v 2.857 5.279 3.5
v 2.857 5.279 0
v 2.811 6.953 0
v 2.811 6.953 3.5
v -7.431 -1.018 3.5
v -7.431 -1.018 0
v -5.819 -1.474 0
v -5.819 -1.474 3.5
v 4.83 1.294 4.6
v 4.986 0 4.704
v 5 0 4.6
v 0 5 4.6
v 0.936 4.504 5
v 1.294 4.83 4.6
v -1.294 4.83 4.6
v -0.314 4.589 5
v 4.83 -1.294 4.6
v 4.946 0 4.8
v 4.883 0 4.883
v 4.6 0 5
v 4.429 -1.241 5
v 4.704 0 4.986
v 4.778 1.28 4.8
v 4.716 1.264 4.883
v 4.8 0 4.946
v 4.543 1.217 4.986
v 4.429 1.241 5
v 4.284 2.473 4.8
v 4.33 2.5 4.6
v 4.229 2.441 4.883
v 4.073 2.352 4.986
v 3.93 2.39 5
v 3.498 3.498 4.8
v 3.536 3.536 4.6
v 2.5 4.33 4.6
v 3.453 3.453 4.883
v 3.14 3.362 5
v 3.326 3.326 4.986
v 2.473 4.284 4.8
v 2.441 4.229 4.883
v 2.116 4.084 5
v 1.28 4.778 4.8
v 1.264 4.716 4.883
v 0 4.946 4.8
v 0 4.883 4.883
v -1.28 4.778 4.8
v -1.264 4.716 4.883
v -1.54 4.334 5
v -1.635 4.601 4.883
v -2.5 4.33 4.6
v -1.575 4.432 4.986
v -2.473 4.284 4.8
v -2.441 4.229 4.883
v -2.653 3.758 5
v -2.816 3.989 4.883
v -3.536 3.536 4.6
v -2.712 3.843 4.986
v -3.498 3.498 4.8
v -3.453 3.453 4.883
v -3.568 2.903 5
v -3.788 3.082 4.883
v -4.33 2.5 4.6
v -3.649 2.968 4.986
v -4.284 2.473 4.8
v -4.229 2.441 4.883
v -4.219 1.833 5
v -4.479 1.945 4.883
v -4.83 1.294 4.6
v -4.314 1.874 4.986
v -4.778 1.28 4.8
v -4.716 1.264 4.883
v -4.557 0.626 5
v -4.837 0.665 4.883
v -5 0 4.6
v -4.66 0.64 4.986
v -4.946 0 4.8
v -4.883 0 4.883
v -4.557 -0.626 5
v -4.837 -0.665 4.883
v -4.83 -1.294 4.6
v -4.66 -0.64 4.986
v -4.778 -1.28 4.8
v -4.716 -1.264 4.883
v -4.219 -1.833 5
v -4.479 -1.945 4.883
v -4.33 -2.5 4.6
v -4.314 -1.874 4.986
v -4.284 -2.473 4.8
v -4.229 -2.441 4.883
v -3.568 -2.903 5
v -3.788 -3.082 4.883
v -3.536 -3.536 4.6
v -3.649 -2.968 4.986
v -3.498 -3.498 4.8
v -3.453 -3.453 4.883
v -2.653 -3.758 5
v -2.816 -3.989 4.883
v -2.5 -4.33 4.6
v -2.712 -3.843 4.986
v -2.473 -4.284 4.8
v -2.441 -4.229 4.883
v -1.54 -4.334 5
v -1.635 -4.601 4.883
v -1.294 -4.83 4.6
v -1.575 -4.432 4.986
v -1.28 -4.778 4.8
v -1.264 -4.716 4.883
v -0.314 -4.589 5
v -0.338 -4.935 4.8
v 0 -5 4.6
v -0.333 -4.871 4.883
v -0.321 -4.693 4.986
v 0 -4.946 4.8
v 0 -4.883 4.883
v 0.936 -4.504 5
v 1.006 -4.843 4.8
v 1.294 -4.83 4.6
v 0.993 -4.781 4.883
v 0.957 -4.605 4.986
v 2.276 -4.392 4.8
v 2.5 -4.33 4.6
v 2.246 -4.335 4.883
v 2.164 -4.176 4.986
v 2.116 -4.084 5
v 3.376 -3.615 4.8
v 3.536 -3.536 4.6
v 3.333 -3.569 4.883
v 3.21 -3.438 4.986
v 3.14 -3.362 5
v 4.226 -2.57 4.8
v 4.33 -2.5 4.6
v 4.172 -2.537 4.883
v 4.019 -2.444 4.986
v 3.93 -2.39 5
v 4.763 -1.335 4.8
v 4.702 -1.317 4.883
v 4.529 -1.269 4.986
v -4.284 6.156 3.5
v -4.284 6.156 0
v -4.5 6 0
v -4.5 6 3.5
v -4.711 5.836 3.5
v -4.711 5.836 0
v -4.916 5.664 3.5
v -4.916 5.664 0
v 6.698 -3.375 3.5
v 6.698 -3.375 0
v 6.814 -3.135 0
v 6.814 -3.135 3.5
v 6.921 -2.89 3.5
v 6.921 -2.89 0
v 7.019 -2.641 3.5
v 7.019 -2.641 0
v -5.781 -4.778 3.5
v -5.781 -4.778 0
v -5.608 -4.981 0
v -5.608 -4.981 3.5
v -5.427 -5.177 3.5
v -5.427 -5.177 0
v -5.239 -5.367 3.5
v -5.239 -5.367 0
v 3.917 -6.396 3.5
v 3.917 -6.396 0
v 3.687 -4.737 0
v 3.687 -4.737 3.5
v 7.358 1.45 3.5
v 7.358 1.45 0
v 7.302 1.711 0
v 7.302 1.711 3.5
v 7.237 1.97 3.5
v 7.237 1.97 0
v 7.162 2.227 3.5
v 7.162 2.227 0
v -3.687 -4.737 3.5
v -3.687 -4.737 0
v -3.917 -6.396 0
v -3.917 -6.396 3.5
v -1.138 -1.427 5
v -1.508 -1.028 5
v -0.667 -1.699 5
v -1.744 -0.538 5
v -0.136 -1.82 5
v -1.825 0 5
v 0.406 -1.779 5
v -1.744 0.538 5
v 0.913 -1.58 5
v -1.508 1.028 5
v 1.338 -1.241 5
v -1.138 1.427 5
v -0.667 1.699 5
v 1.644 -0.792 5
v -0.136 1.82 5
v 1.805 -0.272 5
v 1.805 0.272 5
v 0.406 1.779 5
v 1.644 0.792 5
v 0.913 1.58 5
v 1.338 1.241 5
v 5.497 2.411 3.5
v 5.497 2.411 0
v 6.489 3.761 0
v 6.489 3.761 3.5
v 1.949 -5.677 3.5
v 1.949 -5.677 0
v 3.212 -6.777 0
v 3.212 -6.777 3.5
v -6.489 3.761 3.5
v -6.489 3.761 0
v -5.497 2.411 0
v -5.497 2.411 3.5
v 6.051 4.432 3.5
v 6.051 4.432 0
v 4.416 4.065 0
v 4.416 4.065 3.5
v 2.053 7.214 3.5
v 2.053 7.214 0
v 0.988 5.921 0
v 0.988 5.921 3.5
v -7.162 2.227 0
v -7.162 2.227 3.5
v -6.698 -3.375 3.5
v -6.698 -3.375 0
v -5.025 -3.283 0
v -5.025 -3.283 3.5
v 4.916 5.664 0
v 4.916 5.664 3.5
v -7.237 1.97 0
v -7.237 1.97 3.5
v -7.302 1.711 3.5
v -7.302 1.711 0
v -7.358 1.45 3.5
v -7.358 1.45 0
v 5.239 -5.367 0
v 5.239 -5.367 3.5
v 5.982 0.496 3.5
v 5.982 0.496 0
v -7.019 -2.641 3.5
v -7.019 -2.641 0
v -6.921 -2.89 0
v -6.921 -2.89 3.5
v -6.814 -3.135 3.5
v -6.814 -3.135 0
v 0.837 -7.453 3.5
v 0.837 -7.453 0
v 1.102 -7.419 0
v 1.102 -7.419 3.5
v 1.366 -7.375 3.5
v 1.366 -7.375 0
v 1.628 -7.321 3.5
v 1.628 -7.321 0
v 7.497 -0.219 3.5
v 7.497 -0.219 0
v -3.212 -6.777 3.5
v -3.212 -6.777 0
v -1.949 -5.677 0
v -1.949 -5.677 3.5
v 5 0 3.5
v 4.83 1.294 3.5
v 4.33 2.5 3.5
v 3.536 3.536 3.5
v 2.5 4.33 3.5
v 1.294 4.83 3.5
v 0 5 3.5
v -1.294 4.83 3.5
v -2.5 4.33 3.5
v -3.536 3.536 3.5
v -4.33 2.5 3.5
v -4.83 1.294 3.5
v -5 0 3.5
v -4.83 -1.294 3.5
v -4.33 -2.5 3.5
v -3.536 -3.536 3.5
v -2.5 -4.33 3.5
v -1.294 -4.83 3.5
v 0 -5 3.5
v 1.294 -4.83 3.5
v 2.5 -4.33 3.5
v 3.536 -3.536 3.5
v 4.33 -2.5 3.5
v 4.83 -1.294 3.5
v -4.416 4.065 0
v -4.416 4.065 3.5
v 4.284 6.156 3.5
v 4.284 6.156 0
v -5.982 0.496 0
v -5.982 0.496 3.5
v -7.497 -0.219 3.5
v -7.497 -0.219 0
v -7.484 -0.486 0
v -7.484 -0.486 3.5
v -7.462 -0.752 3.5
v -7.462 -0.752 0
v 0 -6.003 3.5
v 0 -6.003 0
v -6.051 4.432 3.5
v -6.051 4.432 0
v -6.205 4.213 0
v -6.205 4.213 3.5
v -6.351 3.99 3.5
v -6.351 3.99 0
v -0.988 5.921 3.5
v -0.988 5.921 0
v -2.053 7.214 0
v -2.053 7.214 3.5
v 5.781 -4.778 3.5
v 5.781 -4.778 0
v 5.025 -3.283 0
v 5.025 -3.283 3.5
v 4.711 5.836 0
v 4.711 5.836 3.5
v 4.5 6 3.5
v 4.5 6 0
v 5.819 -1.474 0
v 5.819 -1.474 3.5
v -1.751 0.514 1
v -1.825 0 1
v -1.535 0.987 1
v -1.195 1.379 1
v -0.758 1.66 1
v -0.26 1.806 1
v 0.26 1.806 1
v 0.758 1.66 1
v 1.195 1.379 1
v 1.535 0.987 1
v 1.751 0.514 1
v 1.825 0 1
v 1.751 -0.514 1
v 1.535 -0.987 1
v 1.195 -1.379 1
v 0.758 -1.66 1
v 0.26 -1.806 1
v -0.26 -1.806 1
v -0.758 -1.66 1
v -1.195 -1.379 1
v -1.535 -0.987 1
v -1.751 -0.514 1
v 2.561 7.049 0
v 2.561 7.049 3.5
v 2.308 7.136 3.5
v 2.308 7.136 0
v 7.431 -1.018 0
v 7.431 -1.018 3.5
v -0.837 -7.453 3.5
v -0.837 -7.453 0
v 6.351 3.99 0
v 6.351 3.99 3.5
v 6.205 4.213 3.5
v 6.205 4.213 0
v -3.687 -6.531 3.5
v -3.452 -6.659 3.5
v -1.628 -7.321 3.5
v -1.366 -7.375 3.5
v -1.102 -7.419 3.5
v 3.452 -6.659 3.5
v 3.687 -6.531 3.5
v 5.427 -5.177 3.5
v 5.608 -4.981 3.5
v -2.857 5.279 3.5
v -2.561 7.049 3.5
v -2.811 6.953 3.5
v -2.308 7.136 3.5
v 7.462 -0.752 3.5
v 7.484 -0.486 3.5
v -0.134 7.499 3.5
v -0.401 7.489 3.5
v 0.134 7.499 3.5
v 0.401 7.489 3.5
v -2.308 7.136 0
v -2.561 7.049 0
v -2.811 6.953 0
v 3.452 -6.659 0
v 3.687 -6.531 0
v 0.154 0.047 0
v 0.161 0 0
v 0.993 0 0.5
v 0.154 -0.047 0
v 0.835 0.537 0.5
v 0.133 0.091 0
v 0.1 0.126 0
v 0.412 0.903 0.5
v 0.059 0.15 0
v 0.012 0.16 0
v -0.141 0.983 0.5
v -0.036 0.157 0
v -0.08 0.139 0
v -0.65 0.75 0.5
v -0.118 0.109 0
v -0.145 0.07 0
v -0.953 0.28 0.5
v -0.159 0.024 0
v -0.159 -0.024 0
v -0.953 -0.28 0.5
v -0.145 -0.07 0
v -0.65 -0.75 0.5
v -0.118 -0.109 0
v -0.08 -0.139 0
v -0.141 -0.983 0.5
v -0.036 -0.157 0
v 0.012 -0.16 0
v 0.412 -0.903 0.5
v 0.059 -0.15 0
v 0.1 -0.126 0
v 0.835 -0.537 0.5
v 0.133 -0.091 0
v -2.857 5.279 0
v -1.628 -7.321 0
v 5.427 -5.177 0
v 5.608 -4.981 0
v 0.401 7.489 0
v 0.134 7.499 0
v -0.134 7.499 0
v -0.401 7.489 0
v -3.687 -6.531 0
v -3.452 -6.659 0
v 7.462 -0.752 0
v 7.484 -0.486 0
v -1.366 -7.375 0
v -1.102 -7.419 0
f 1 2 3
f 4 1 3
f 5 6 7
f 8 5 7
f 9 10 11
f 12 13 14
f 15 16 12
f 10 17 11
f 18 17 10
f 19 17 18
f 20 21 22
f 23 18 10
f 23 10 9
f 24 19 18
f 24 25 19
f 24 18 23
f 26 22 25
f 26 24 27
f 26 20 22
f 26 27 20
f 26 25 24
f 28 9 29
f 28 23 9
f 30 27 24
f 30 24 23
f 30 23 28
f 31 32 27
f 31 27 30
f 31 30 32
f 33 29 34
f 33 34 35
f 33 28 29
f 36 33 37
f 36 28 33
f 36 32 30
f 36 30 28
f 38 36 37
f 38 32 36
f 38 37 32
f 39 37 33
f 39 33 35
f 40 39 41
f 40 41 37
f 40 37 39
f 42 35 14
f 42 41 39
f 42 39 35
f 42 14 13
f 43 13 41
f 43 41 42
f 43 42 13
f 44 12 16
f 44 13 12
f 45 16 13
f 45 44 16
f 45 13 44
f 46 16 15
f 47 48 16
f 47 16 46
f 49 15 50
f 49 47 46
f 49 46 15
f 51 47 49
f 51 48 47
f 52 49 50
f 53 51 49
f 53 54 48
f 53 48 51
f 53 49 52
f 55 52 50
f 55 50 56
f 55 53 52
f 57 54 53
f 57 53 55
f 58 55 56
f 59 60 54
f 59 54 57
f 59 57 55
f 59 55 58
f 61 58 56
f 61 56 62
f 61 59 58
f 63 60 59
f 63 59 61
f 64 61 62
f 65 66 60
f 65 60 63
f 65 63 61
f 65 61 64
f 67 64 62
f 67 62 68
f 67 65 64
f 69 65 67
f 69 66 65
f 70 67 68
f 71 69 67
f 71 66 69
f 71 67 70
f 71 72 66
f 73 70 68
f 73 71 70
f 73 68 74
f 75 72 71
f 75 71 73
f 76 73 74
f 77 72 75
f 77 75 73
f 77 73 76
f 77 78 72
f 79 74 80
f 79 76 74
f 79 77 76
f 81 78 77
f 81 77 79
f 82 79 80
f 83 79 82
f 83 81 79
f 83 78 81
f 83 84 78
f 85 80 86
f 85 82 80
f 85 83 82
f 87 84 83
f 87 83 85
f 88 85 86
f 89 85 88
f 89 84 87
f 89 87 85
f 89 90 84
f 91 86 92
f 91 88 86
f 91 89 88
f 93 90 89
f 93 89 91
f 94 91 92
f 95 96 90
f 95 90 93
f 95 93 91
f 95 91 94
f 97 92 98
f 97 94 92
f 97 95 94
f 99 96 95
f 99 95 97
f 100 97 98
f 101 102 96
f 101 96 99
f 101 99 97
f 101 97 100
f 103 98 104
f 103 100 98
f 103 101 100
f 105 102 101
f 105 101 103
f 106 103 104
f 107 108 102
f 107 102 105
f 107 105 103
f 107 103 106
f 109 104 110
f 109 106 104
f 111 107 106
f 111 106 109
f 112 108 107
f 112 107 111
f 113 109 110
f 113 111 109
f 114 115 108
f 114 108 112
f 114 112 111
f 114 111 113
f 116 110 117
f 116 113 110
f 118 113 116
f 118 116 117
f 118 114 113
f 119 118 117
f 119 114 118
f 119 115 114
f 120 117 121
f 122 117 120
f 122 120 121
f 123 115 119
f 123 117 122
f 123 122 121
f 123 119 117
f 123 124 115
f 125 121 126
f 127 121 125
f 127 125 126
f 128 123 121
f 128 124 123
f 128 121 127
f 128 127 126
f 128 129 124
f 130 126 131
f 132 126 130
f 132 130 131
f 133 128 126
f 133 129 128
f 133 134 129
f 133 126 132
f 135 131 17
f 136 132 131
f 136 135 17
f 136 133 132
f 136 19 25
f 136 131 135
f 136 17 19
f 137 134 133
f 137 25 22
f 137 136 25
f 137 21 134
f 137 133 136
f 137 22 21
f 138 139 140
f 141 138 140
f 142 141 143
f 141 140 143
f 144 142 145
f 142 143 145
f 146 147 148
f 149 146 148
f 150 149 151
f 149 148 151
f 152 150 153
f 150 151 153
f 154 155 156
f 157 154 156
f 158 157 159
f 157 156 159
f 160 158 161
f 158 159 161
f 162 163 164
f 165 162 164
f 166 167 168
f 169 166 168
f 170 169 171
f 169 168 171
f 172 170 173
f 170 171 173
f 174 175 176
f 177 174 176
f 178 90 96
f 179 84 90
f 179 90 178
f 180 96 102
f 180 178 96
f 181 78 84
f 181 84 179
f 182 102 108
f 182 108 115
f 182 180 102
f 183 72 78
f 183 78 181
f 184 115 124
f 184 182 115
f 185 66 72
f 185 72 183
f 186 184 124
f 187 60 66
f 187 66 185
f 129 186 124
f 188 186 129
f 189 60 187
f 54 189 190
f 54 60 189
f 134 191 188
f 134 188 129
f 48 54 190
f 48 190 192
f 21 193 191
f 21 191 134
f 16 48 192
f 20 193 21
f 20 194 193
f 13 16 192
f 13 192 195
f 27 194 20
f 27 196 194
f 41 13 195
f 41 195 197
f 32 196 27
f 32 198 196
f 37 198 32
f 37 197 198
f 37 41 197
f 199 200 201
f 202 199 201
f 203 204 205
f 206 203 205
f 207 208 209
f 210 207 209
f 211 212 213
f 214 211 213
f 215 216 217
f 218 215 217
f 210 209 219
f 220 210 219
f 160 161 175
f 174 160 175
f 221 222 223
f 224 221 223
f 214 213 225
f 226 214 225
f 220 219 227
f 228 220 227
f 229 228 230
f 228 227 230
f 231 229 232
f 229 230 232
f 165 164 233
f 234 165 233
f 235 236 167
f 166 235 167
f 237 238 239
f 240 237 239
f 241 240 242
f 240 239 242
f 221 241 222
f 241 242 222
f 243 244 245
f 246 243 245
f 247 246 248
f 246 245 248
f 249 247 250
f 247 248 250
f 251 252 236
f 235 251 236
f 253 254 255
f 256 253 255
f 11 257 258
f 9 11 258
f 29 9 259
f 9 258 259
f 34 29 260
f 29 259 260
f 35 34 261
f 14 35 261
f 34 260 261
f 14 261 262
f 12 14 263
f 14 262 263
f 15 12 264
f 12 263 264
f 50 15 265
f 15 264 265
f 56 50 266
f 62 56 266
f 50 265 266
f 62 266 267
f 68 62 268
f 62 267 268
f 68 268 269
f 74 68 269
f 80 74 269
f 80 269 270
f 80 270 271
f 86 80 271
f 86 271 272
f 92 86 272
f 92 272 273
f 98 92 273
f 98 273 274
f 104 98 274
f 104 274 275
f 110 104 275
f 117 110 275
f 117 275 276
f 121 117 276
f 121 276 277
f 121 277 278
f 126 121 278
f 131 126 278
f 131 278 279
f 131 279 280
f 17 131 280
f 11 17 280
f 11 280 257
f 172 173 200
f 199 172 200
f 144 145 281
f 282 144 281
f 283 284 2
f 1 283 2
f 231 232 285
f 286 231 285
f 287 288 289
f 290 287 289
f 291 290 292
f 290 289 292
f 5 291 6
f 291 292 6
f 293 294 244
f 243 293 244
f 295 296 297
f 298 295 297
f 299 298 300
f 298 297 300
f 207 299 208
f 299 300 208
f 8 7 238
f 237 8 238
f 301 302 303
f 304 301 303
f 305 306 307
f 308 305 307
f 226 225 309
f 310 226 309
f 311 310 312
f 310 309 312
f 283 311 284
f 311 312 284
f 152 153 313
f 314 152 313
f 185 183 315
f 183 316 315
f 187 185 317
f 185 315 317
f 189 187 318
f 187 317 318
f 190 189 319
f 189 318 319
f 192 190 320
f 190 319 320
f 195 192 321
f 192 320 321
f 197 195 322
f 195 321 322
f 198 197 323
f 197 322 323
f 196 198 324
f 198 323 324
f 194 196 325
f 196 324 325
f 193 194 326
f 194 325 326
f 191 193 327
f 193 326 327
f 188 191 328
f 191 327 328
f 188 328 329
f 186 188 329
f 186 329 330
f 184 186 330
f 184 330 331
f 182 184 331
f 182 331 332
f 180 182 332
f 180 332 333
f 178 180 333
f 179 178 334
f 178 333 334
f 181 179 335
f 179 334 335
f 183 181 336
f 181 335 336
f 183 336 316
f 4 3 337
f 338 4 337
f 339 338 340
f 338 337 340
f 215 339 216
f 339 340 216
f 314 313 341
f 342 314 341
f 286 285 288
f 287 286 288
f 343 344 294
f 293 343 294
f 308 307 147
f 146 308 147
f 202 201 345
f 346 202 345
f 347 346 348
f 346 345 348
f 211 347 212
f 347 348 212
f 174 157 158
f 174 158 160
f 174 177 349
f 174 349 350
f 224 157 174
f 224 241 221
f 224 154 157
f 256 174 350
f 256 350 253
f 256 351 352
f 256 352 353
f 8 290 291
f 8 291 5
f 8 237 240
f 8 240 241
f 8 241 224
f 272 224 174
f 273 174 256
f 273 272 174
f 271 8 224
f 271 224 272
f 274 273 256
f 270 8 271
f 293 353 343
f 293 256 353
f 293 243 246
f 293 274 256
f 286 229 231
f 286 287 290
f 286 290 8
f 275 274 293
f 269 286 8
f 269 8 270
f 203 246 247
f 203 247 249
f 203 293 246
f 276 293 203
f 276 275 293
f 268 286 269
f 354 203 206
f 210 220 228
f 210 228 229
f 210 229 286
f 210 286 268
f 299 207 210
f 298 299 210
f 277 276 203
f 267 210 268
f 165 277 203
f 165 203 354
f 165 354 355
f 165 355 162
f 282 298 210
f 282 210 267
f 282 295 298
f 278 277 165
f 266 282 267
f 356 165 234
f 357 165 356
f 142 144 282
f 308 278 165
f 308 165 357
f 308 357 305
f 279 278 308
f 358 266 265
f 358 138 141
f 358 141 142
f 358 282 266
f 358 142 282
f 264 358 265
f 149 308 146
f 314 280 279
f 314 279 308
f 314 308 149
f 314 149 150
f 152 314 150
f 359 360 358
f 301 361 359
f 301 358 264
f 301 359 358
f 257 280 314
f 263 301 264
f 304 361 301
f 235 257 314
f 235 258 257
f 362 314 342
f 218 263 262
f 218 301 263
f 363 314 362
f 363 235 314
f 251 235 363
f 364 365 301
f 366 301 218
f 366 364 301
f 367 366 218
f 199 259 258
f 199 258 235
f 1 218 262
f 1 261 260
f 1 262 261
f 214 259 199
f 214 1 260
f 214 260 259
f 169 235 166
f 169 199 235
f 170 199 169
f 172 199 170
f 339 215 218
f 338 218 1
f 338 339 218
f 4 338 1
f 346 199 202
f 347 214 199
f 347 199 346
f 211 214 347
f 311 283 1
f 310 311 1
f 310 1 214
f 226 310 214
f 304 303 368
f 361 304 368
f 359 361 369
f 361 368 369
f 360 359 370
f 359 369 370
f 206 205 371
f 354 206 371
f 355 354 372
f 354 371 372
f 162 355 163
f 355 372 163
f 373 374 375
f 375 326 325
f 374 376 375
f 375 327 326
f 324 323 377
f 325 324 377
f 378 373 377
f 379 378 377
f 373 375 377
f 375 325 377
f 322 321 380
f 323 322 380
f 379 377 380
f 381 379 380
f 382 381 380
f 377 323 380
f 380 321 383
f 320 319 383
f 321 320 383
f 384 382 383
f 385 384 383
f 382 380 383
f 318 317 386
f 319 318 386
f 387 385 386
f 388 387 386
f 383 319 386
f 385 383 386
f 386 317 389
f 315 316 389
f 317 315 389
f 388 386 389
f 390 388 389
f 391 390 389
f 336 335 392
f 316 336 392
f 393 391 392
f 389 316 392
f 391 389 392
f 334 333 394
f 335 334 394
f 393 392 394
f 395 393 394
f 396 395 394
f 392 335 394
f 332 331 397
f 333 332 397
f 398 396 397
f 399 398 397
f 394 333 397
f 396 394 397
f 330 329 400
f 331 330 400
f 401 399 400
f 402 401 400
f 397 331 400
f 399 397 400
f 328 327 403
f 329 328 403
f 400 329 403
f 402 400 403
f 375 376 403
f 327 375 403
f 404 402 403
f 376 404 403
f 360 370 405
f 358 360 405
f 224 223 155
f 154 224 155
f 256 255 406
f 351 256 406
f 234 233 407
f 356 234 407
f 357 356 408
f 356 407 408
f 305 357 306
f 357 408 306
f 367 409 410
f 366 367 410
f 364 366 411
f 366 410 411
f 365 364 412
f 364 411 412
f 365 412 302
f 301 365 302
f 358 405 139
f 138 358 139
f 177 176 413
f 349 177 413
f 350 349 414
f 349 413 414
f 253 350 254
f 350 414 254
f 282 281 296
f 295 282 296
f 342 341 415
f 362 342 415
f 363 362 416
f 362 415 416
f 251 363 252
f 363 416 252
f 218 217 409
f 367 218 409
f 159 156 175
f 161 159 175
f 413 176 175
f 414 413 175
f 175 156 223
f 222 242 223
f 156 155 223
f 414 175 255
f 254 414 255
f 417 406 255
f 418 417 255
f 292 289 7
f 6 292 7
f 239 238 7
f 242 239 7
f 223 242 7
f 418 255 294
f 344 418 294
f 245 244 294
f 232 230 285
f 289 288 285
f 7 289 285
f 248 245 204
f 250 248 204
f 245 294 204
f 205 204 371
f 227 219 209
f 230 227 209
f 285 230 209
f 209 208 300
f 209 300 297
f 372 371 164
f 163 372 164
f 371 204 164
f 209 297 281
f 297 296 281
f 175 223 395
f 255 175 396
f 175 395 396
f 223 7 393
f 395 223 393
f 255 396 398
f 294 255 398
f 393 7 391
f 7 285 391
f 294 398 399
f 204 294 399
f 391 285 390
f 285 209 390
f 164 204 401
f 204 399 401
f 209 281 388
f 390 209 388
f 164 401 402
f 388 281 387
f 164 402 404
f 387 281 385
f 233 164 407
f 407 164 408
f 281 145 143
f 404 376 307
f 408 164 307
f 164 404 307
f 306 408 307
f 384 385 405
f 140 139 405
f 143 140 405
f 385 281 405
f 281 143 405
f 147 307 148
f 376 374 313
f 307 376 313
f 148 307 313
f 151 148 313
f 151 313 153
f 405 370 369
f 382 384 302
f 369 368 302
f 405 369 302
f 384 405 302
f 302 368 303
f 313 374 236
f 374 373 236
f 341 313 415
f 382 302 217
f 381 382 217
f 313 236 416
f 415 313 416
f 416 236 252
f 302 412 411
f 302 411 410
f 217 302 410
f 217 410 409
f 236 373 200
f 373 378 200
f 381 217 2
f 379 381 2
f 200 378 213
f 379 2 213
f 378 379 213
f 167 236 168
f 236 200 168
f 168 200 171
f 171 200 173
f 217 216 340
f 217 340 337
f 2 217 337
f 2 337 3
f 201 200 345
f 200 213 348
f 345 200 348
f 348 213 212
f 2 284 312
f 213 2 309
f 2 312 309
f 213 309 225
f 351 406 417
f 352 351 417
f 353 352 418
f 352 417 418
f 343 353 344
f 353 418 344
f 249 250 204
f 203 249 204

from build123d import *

# Parameters (mm, degrees)
F0_R     = 5
F1_DEPTH = 3.5
F2_DEPTH = 5
F4_D     = 3.65
F4_DEPTH = 4
F4_TIP   = 1.0965706297
F5_R     = 0.4


with BuildPart() as f1:
    # F0 (on Top) → F1 (new body)
    with BuildSketch(Plane.XY):
        with BuildLine():
            Line((5.9820292349, 0.4956850747), (7.3584798307, 1.4500946799))
            ThreePointArc((7.3584798307, 1.4500946799), (7.2705019945, 1.8411411536), (7.1617586425, 2.2269290844))
            Line((7.1617586425, 2.2269290844), (5.4969577101, 2.4111892074))
            Line((5.4969577101, 2.4111892074), (6.4889321237, 3.7608190456))
            ThreePointArc((6.4889321237, 3.7608190456), (6.278748587, 4.1021111859), (6.0506321133, 4.4316871538))
            Line((6.0506321133, 4.4316871538), (4.4162055233, 4.0654035761))
            Line((4.4162055233, 4.0654035761), (4.916207935, 5.6640003125))
            ThreePointArc((4.916207935, 5.6640003125), (4.6065953452, 5.9185538205), (4.2838257094, 6.1562031555))
            Line((4.2838257094, 6.1562031555), (2.8568889436, 5.279068386))
            Line((2.8568889436, 5.279068386), (2.8107363336, 6.9533992596))
            ThreePointArc((2.8107363336, 6.9533992596), (2.435246019, 7.0936293128), (2.0528003195, 7.2135990219))
            Line((2.0528003195, 7.2135990219), (0.9879841176, 5.9206642232))
            Line((0.9879841176, 5.9206642232), (0.4006778375, 7.4892895037))
            ThreePointArc((0.4006778375, 7.4892895037), (0, 7.5), (-0.4006778375, 7.4892895037))
            Line((-0.4006778375, 7.4892895037), (-0.9879841176, 5.9206642232))
            Line((-0.9879841176, 5.9206642232), (-2.0528003195, 7.2135990219))
            ThreePointArc((-2.0528003195, 7.2135990219), (-2.435246019, 7.0936293128), (-2.8107363336, 6.9533992596))
            Line((-2.8107363336, 6.9533992596), (-2.8568889436, 5.279068386))
            Line((-2.8568889436, 5.279068386), (-4.2838257094, 6.1562031555))
            ThreePointArc((-4.2838257094, 6.1562031555), (-4.6065953452, 5.9185538205), (-4.916207935, 5.6640003125))
            Line((-4.916207935, 5.6640003125), (-4.4162055233, 4.0654035761))
            Line((-4.4162055233, 4.0654035761), (-6.0506321133, 4.4316871538))
            ThreePointArc((-6.0506321133, 4.4316871538), (-6.278748587, 4.1021111859), (-6.4889321237, 3.7608190456))
            Line((-6.4889321237, 3.7608190456), (-5.4969577101, 2.4111892074))
            Line((-5.4969577101, 2.4111892074), (-7.1617586425, 2.2269290844))
            ThreePointArc((-7.1617586425, 2.2269290844), (-7.2705019945, 1.8411411536), (-7.3584798307, 1.4500946799))
            Line((-7.3584798307, 1.4500946799), (-5.9820292349, 0.4956850747))
            Line((-5.9820292349, 0.4956850747), (-7.4967974966, -0.2191513057))
            ThreePointArc((-7.4967974966, -0.2191513057), (-7.4743836976, -0.619345091), (-7.4306220695, -1.0177699448))
            Line((-7.4306220695, -1.0177699448), (-5.8188550714, -1.4735342273))
            Line((-5.8188550714, -1.4735342273), (-7.0194420172, -2.6414832514))
            ThreePointArc((-7.0194420172, -2.6414832514), (-6.8682999499, -3.0127156849), (-6.697541109, -3.3753434037))
            Line((-6.697541109, -3.3753434037), (-5.025117672, -3.2830732315))
            Line((-5.025117672, -3.2830732315), (-5.7814210773, -4.7775694999))
            ThreePointArc((-5.7814210773, -4.7775694999), (-5.51792933, -5.0796117872), (-5.2386776463, -5.367146031))
            Line((-5.2386776463, -5.367146031), (-3.6868308001, -4.7368403089))
            Line((-3.6868308001, -4.7368403089), (-3.9168934558, -6.3959319615))
            ThreePointArc((-3.9168934558, -6.3959319615), (-3.5696054478, -6.596053134), (-3.2121221742, -6.7773351059))
            Line((-3.2121221742, -6.7773351059), (-1.949018604, -5.6772972392))
            Line((-1.949018604, -5.6772972392), (-1.6279096514, -7.321195952))
            ThreePointArc((-1.6279096514, -7.321195952), (-1.2344594271, -7.3977097755), (-0.8374834233, -7.4530947609))
            Line((-0.8374834233, -7.4530947609), (0, -6.0025309213))
            Line((0, -6.0025309213), (0.8374834233, -7.4530947609))
            ThreePointArc((0.8374834233, -7.4530947609), (1.2344594271, -7.3977097755), (1.6279096514, -7.321195952))
            Line((1.6279096514, -7.321195952), (1.949018604, -5.6772972392))
            Line((1.949018604, -5.6772972392), (3.2121221742, -6.7773351059))
            ThreePointArc((3.2121221742, -6.7773351059), (3.5696054478, -6.596053134), (3.9168934558, -6.3959319615))
            Line((3.9168934558, -6.3959319615), (3.6868308001, -4.7368403089))
            Line((3.6868308001, -4.7368403089), (5.2386776463, -5.367146031))
            ThreePointArc((5.2386776463, -5.367146031), (5.51792933, -5.0796117872), (5.7814210773, -4.7775694999))
            Line((5.7814210773, -4.7775694999), (5.025117672, -3.2830732315))
            Line((5.025117672, -3.2830732315), (6.697541109, -3.3753434037))
            ThreePointArc((6.697541109, -3.3753434037), (6.8682999499, -3.0127156849), (7.0194420172, -2.6414832514))
            Line((7.0194420172, -2.6414832514), (5.8188550714, -1.4735342273))
            Line((5.8188550714, -1.4735342273), (7.4306220695, -1.0177699448))
            ThreePointArc((7.4306220695, -1.0177699448), (7.4743836976, -0.619345091), (7.4967974966, -0.2191513057))
            Line((7.4967974966, -0.2191513057), (5.9820292349, 0.4956850747))
        make_face()
        Circle(F0_R, mode=Mode.SUBTRACT)
    extrude(amount=F1_DEPTH)

    # F0 (on Top) → F2 (join)
    with BuildSketch(Plane.XY):
        Circle(F0_R)
    extrude(amount=F2_DEPTH)

    # F4
    with Locations(Plane.XY.offset(5)):
        with Locations((0, 0)):
            Hole(F4_D / 2, depth=F4_DEPTH)
            with Locations((0, 0, -(F4_DEPTH + F4_TIP / 2))):  # 118° drill point
                Cone(0, F4_D / 2, F4_TIP, mode=Mode.SUBTRACT)

    # F5
    f5_edges = [f1.edges().sort_by_distance(p)[0] for p in [
        (-5, 0, 5),
    ]]
    fillet(f5_edges, radius=F5_R)


solid = f1.part
